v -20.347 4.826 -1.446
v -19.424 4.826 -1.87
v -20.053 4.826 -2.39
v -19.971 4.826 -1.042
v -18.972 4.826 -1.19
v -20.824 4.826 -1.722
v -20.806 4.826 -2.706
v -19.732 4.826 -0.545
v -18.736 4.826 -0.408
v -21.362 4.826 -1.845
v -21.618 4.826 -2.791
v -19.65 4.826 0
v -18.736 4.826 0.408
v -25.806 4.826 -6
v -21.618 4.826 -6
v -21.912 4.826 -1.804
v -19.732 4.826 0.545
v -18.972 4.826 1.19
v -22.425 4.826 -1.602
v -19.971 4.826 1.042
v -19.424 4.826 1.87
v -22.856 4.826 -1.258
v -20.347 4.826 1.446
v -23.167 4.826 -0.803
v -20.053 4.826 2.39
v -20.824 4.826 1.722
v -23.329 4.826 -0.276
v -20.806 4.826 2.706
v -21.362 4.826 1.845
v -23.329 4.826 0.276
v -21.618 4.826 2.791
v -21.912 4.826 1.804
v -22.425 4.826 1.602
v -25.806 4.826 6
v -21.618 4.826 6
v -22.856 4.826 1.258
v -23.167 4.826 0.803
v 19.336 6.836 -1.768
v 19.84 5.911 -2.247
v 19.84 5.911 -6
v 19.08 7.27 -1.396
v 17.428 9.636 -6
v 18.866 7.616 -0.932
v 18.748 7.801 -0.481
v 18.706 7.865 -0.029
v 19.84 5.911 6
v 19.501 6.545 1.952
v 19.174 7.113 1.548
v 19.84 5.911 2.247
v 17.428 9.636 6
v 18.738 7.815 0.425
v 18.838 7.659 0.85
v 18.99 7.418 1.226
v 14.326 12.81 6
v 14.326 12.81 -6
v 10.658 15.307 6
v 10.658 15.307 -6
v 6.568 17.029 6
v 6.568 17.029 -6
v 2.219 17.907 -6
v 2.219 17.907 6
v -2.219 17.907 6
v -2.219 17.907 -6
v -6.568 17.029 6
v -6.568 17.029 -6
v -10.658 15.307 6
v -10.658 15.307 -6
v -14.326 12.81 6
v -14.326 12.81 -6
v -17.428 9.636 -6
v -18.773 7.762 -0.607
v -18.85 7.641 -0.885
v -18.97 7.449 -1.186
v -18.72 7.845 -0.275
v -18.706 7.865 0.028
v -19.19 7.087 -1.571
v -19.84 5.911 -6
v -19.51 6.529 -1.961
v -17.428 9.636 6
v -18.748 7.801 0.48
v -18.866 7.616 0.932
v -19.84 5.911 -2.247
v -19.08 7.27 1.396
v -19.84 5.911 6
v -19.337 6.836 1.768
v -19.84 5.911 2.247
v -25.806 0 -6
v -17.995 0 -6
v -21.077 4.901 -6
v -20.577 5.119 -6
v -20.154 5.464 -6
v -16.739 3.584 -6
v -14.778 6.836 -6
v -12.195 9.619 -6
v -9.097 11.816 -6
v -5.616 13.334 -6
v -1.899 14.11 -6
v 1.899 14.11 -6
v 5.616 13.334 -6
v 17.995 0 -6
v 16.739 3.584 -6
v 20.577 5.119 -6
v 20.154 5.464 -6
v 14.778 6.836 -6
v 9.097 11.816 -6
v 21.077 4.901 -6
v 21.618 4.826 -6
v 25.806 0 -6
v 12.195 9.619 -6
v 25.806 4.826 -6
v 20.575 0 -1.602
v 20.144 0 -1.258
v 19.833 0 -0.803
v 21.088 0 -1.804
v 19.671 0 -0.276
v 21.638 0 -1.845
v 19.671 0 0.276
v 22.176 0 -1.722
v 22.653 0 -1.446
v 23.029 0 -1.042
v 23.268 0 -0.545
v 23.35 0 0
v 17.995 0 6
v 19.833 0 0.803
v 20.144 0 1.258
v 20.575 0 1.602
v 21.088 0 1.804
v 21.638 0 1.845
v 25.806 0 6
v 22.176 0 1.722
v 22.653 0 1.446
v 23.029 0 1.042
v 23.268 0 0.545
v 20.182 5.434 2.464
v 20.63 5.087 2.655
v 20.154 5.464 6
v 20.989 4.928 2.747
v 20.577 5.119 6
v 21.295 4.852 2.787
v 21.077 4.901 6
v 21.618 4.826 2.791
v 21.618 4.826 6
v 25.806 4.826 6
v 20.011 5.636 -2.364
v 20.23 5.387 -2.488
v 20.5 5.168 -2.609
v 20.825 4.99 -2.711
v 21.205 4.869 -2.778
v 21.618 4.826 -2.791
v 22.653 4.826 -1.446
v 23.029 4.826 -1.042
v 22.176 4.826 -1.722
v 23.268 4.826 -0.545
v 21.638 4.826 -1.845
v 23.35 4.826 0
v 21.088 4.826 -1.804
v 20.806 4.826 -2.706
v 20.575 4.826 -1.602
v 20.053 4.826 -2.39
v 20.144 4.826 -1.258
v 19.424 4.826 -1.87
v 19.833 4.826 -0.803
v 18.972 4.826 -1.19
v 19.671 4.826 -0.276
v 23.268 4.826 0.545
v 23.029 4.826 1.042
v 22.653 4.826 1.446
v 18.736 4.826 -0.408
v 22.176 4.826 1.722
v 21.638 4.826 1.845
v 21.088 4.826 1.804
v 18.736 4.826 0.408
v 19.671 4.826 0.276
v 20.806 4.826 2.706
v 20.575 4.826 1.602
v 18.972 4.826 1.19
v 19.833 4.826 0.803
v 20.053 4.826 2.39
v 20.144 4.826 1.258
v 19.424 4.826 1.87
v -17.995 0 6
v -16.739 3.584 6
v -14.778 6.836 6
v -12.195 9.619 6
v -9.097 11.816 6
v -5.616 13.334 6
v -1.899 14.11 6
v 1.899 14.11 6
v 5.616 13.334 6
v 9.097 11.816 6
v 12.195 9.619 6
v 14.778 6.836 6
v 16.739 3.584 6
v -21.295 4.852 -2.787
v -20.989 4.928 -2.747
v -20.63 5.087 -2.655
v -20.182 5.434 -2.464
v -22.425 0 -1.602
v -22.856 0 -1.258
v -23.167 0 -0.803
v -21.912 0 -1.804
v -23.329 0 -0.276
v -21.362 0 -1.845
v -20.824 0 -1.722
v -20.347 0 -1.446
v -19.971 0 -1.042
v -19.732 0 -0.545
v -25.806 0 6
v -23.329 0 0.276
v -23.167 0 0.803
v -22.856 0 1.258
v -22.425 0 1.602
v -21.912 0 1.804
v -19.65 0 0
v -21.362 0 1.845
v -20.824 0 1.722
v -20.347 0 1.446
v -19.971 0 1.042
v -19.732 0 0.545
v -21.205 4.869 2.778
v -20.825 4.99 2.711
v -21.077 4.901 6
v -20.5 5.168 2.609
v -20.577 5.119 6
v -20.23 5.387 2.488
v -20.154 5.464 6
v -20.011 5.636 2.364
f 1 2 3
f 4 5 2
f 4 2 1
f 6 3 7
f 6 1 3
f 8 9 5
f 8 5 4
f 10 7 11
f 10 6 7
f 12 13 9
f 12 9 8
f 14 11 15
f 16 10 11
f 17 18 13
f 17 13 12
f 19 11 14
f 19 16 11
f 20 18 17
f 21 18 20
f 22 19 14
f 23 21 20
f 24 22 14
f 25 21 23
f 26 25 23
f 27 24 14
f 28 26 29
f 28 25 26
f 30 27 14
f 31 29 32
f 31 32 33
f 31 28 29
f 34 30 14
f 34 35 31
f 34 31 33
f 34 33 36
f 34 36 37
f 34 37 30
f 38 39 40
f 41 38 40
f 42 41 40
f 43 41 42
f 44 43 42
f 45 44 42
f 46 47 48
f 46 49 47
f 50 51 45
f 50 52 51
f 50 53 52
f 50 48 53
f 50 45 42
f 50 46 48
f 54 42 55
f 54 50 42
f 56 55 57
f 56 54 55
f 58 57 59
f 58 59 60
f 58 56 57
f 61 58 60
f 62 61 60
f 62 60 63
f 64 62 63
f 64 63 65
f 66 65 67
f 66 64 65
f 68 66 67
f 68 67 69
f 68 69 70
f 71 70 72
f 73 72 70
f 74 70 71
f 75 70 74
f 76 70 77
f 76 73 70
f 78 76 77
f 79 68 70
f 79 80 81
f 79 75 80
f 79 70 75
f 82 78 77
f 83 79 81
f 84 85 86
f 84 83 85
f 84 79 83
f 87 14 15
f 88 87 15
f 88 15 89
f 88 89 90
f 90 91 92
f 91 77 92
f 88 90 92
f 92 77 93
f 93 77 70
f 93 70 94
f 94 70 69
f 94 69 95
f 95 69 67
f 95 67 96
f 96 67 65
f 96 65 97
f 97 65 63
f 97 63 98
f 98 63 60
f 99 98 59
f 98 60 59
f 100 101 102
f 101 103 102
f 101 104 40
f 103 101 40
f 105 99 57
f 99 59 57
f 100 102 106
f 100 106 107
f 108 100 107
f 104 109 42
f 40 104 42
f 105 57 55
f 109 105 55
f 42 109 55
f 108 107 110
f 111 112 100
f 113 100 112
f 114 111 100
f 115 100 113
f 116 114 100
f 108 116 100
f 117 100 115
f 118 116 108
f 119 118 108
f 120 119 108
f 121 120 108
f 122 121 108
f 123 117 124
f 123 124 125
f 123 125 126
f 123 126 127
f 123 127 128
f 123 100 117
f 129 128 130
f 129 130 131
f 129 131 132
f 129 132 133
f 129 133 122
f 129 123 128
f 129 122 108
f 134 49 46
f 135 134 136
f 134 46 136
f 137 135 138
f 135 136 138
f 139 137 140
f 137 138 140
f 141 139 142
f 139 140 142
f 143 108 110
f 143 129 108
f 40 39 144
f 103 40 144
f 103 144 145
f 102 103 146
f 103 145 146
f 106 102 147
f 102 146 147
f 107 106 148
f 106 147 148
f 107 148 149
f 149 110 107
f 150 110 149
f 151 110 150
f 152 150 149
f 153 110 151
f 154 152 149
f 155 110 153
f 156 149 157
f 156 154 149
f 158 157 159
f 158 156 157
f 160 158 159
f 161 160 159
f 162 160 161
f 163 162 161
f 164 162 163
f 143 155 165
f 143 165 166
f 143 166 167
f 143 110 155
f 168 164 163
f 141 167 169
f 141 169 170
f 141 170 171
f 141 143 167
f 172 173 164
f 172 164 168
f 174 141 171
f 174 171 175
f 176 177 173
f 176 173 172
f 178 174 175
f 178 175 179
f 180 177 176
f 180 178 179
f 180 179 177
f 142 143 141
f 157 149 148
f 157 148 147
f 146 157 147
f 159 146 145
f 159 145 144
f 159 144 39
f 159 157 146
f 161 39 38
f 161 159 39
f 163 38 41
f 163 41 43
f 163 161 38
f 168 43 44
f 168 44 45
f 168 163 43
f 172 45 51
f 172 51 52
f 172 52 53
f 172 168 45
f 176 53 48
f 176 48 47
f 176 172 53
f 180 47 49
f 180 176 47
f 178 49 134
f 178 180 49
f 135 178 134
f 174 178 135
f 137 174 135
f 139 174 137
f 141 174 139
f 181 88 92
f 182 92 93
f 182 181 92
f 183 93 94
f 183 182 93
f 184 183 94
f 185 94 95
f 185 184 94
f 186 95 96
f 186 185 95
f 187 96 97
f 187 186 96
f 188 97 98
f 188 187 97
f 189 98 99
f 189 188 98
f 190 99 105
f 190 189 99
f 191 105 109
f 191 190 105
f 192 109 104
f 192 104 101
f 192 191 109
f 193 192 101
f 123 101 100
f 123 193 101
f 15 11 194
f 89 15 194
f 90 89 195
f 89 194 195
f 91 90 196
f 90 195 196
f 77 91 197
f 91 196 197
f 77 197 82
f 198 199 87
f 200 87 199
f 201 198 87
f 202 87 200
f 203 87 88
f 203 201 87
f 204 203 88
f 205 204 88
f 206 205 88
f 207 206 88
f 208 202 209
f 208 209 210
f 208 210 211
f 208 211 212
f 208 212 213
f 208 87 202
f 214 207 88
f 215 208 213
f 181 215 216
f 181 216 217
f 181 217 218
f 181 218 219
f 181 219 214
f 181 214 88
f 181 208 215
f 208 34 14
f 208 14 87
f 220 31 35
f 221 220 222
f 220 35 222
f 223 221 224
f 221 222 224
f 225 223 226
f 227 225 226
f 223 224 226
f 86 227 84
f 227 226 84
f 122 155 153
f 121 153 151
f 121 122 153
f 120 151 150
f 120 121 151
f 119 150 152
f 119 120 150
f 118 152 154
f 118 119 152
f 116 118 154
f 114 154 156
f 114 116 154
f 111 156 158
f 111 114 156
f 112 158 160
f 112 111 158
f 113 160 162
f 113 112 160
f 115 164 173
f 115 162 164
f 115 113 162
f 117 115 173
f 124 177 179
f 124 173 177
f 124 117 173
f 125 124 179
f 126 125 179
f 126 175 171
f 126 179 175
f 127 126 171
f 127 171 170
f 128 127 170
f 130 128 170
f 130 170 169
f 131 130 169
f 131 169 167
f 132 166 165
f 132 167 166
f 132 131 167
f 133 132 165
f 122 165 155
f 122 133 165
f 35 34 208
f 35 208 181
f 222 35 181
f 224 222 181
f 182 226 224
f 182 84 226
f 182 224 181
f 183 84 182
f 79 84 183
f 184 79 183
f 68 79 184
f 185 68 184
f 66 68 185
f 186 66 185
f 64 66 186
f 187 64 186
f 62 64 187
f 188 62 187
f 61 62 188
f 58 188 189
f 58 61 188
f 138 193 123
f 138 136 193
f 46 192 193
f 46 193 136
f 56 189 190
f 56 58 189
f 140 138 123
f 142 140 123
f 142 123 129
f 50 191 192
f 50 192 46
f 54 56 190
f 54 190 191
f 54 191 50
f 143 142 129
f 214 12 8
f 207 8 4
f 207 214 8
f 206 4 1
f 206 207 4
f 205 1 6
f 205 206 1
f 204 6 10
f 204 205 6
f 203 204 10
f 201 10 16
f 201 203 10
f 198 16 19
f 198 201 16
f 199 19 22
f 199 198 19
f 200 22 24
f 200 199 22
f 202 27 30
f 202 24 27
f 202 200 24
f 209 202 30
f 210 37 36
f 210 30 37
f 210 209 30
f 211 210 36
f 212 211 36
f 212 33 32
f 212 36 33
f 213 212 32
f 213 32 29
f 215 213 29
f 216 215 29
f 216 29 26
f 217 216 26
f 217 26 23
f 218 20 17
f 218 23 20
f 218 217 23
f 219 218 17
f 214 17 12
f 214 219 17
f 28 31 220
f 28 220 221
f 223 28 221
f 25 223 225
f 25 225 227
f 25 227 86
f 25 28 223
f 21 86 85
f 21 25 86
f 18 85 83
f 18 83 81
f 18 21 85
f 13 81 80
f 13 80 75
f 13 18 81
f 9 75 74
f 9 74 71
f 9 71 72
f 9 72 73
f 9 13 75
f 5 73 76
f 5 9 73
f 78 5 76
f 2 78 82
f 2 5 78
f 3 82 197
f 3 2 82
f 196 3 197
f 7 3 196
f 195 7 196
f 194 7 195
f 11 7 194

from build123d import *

# Parameters (mm, degrees)
BOSS_EXTRUDE1_DEPTH      = 6
BOSS_EXTRUDE1_DEPTH_BACK = 6
FILLET1_R                = 2
CUT_EXTRUDE2_DEPTH       = 4.826
CUT_EXTRUDE2_DEPTH_BACK  = 4.826
SKETCH3_R                = 1.85
SKETCH4_R                = 2.794
CUT_EXTRUDE3_DEPTH       = 4.826


with BuildPart() as part:
    # Sketch1 → Boss-Extrude1 (new, two sides: drawn at the far end of the back side and taken through both)
    with BuildSketch(Plane.XY.offset(-BOSS_EXTRUDE1_DEPTH_BACK)):
        with BuildLine():
            Line((25.8064, 0), (25.8064, 4.826))
            Line((25.8064, 4.826), (20.361415325, 4.826))
            ThreePointArc((20.361415325, 4.826), (0, 18.0174), (-20.361415325, 4.826))
            Line((-20.361415325, 4.826), (-25.8064, 4.826))
            Line((-25.8064, 4.826), (-25.8064, 0))
            Line((-25.8064, 0), (-17.995098923, 0))
            ThreePointArc((-17.995098923, 0), (0, 14.2074), (17.995098923, 0))
            Line((17.995098923, 0), (25.8064, 0))
        make_face()
    extrude(amount=BOSS_EXTRUDE1_DEPTH + BOSS_EXTRUDE1_DEPTH_BACK)

    # Fillet1
    fillet1_edges = [part.edges().sort_by_distance(p)[0] for p in [
        (20.361415325, 4.826, 0),
        (-20.361415325, 4.826, 0),
    ]]
    fillet(fillet1_edges, radius=FILLET1_R)

    # Sketch3 → Cut-Extrude2 (cut, two sides: drawn at the far end of the back side and taken through both)
    with BuildSketch(Plane(origin=(0, 0, 0), x_dir=(1, 0, 0), z_dir=(0, 1, 0)).offset(-CUT_EXTRUDE2_DEPTH_BACK)):
        with Locations((21.5, 0)):
            Circle(SKETCH3_R)
        with Locations((-21.5, 0)):
            Circle(SKETCH3_R)
    extrude(amount=CUT_EXTRUDE2_DEPTH + CUT_EXTRUDE2_DEPTH_BACK, mode=Mode.SUBTRACT)

    # Sketch4 → Cut-Extrude3 (cut)
    with BuildSketch(Plane(origin=(0, 4.826, 0), x_dir=(1, 0, 0), z_dir=(0, 1, 0))):
        with Locations((-21.5, 0)):
            Circle(SKETCH4_R)
        with Locations((21.5, 0)):
            Circle(SKETCH4_R)
    extrude(amount=CUT_EXTRUDE3_DEPTH, mode=Mode.SUBTRACT)


solid = part.part
